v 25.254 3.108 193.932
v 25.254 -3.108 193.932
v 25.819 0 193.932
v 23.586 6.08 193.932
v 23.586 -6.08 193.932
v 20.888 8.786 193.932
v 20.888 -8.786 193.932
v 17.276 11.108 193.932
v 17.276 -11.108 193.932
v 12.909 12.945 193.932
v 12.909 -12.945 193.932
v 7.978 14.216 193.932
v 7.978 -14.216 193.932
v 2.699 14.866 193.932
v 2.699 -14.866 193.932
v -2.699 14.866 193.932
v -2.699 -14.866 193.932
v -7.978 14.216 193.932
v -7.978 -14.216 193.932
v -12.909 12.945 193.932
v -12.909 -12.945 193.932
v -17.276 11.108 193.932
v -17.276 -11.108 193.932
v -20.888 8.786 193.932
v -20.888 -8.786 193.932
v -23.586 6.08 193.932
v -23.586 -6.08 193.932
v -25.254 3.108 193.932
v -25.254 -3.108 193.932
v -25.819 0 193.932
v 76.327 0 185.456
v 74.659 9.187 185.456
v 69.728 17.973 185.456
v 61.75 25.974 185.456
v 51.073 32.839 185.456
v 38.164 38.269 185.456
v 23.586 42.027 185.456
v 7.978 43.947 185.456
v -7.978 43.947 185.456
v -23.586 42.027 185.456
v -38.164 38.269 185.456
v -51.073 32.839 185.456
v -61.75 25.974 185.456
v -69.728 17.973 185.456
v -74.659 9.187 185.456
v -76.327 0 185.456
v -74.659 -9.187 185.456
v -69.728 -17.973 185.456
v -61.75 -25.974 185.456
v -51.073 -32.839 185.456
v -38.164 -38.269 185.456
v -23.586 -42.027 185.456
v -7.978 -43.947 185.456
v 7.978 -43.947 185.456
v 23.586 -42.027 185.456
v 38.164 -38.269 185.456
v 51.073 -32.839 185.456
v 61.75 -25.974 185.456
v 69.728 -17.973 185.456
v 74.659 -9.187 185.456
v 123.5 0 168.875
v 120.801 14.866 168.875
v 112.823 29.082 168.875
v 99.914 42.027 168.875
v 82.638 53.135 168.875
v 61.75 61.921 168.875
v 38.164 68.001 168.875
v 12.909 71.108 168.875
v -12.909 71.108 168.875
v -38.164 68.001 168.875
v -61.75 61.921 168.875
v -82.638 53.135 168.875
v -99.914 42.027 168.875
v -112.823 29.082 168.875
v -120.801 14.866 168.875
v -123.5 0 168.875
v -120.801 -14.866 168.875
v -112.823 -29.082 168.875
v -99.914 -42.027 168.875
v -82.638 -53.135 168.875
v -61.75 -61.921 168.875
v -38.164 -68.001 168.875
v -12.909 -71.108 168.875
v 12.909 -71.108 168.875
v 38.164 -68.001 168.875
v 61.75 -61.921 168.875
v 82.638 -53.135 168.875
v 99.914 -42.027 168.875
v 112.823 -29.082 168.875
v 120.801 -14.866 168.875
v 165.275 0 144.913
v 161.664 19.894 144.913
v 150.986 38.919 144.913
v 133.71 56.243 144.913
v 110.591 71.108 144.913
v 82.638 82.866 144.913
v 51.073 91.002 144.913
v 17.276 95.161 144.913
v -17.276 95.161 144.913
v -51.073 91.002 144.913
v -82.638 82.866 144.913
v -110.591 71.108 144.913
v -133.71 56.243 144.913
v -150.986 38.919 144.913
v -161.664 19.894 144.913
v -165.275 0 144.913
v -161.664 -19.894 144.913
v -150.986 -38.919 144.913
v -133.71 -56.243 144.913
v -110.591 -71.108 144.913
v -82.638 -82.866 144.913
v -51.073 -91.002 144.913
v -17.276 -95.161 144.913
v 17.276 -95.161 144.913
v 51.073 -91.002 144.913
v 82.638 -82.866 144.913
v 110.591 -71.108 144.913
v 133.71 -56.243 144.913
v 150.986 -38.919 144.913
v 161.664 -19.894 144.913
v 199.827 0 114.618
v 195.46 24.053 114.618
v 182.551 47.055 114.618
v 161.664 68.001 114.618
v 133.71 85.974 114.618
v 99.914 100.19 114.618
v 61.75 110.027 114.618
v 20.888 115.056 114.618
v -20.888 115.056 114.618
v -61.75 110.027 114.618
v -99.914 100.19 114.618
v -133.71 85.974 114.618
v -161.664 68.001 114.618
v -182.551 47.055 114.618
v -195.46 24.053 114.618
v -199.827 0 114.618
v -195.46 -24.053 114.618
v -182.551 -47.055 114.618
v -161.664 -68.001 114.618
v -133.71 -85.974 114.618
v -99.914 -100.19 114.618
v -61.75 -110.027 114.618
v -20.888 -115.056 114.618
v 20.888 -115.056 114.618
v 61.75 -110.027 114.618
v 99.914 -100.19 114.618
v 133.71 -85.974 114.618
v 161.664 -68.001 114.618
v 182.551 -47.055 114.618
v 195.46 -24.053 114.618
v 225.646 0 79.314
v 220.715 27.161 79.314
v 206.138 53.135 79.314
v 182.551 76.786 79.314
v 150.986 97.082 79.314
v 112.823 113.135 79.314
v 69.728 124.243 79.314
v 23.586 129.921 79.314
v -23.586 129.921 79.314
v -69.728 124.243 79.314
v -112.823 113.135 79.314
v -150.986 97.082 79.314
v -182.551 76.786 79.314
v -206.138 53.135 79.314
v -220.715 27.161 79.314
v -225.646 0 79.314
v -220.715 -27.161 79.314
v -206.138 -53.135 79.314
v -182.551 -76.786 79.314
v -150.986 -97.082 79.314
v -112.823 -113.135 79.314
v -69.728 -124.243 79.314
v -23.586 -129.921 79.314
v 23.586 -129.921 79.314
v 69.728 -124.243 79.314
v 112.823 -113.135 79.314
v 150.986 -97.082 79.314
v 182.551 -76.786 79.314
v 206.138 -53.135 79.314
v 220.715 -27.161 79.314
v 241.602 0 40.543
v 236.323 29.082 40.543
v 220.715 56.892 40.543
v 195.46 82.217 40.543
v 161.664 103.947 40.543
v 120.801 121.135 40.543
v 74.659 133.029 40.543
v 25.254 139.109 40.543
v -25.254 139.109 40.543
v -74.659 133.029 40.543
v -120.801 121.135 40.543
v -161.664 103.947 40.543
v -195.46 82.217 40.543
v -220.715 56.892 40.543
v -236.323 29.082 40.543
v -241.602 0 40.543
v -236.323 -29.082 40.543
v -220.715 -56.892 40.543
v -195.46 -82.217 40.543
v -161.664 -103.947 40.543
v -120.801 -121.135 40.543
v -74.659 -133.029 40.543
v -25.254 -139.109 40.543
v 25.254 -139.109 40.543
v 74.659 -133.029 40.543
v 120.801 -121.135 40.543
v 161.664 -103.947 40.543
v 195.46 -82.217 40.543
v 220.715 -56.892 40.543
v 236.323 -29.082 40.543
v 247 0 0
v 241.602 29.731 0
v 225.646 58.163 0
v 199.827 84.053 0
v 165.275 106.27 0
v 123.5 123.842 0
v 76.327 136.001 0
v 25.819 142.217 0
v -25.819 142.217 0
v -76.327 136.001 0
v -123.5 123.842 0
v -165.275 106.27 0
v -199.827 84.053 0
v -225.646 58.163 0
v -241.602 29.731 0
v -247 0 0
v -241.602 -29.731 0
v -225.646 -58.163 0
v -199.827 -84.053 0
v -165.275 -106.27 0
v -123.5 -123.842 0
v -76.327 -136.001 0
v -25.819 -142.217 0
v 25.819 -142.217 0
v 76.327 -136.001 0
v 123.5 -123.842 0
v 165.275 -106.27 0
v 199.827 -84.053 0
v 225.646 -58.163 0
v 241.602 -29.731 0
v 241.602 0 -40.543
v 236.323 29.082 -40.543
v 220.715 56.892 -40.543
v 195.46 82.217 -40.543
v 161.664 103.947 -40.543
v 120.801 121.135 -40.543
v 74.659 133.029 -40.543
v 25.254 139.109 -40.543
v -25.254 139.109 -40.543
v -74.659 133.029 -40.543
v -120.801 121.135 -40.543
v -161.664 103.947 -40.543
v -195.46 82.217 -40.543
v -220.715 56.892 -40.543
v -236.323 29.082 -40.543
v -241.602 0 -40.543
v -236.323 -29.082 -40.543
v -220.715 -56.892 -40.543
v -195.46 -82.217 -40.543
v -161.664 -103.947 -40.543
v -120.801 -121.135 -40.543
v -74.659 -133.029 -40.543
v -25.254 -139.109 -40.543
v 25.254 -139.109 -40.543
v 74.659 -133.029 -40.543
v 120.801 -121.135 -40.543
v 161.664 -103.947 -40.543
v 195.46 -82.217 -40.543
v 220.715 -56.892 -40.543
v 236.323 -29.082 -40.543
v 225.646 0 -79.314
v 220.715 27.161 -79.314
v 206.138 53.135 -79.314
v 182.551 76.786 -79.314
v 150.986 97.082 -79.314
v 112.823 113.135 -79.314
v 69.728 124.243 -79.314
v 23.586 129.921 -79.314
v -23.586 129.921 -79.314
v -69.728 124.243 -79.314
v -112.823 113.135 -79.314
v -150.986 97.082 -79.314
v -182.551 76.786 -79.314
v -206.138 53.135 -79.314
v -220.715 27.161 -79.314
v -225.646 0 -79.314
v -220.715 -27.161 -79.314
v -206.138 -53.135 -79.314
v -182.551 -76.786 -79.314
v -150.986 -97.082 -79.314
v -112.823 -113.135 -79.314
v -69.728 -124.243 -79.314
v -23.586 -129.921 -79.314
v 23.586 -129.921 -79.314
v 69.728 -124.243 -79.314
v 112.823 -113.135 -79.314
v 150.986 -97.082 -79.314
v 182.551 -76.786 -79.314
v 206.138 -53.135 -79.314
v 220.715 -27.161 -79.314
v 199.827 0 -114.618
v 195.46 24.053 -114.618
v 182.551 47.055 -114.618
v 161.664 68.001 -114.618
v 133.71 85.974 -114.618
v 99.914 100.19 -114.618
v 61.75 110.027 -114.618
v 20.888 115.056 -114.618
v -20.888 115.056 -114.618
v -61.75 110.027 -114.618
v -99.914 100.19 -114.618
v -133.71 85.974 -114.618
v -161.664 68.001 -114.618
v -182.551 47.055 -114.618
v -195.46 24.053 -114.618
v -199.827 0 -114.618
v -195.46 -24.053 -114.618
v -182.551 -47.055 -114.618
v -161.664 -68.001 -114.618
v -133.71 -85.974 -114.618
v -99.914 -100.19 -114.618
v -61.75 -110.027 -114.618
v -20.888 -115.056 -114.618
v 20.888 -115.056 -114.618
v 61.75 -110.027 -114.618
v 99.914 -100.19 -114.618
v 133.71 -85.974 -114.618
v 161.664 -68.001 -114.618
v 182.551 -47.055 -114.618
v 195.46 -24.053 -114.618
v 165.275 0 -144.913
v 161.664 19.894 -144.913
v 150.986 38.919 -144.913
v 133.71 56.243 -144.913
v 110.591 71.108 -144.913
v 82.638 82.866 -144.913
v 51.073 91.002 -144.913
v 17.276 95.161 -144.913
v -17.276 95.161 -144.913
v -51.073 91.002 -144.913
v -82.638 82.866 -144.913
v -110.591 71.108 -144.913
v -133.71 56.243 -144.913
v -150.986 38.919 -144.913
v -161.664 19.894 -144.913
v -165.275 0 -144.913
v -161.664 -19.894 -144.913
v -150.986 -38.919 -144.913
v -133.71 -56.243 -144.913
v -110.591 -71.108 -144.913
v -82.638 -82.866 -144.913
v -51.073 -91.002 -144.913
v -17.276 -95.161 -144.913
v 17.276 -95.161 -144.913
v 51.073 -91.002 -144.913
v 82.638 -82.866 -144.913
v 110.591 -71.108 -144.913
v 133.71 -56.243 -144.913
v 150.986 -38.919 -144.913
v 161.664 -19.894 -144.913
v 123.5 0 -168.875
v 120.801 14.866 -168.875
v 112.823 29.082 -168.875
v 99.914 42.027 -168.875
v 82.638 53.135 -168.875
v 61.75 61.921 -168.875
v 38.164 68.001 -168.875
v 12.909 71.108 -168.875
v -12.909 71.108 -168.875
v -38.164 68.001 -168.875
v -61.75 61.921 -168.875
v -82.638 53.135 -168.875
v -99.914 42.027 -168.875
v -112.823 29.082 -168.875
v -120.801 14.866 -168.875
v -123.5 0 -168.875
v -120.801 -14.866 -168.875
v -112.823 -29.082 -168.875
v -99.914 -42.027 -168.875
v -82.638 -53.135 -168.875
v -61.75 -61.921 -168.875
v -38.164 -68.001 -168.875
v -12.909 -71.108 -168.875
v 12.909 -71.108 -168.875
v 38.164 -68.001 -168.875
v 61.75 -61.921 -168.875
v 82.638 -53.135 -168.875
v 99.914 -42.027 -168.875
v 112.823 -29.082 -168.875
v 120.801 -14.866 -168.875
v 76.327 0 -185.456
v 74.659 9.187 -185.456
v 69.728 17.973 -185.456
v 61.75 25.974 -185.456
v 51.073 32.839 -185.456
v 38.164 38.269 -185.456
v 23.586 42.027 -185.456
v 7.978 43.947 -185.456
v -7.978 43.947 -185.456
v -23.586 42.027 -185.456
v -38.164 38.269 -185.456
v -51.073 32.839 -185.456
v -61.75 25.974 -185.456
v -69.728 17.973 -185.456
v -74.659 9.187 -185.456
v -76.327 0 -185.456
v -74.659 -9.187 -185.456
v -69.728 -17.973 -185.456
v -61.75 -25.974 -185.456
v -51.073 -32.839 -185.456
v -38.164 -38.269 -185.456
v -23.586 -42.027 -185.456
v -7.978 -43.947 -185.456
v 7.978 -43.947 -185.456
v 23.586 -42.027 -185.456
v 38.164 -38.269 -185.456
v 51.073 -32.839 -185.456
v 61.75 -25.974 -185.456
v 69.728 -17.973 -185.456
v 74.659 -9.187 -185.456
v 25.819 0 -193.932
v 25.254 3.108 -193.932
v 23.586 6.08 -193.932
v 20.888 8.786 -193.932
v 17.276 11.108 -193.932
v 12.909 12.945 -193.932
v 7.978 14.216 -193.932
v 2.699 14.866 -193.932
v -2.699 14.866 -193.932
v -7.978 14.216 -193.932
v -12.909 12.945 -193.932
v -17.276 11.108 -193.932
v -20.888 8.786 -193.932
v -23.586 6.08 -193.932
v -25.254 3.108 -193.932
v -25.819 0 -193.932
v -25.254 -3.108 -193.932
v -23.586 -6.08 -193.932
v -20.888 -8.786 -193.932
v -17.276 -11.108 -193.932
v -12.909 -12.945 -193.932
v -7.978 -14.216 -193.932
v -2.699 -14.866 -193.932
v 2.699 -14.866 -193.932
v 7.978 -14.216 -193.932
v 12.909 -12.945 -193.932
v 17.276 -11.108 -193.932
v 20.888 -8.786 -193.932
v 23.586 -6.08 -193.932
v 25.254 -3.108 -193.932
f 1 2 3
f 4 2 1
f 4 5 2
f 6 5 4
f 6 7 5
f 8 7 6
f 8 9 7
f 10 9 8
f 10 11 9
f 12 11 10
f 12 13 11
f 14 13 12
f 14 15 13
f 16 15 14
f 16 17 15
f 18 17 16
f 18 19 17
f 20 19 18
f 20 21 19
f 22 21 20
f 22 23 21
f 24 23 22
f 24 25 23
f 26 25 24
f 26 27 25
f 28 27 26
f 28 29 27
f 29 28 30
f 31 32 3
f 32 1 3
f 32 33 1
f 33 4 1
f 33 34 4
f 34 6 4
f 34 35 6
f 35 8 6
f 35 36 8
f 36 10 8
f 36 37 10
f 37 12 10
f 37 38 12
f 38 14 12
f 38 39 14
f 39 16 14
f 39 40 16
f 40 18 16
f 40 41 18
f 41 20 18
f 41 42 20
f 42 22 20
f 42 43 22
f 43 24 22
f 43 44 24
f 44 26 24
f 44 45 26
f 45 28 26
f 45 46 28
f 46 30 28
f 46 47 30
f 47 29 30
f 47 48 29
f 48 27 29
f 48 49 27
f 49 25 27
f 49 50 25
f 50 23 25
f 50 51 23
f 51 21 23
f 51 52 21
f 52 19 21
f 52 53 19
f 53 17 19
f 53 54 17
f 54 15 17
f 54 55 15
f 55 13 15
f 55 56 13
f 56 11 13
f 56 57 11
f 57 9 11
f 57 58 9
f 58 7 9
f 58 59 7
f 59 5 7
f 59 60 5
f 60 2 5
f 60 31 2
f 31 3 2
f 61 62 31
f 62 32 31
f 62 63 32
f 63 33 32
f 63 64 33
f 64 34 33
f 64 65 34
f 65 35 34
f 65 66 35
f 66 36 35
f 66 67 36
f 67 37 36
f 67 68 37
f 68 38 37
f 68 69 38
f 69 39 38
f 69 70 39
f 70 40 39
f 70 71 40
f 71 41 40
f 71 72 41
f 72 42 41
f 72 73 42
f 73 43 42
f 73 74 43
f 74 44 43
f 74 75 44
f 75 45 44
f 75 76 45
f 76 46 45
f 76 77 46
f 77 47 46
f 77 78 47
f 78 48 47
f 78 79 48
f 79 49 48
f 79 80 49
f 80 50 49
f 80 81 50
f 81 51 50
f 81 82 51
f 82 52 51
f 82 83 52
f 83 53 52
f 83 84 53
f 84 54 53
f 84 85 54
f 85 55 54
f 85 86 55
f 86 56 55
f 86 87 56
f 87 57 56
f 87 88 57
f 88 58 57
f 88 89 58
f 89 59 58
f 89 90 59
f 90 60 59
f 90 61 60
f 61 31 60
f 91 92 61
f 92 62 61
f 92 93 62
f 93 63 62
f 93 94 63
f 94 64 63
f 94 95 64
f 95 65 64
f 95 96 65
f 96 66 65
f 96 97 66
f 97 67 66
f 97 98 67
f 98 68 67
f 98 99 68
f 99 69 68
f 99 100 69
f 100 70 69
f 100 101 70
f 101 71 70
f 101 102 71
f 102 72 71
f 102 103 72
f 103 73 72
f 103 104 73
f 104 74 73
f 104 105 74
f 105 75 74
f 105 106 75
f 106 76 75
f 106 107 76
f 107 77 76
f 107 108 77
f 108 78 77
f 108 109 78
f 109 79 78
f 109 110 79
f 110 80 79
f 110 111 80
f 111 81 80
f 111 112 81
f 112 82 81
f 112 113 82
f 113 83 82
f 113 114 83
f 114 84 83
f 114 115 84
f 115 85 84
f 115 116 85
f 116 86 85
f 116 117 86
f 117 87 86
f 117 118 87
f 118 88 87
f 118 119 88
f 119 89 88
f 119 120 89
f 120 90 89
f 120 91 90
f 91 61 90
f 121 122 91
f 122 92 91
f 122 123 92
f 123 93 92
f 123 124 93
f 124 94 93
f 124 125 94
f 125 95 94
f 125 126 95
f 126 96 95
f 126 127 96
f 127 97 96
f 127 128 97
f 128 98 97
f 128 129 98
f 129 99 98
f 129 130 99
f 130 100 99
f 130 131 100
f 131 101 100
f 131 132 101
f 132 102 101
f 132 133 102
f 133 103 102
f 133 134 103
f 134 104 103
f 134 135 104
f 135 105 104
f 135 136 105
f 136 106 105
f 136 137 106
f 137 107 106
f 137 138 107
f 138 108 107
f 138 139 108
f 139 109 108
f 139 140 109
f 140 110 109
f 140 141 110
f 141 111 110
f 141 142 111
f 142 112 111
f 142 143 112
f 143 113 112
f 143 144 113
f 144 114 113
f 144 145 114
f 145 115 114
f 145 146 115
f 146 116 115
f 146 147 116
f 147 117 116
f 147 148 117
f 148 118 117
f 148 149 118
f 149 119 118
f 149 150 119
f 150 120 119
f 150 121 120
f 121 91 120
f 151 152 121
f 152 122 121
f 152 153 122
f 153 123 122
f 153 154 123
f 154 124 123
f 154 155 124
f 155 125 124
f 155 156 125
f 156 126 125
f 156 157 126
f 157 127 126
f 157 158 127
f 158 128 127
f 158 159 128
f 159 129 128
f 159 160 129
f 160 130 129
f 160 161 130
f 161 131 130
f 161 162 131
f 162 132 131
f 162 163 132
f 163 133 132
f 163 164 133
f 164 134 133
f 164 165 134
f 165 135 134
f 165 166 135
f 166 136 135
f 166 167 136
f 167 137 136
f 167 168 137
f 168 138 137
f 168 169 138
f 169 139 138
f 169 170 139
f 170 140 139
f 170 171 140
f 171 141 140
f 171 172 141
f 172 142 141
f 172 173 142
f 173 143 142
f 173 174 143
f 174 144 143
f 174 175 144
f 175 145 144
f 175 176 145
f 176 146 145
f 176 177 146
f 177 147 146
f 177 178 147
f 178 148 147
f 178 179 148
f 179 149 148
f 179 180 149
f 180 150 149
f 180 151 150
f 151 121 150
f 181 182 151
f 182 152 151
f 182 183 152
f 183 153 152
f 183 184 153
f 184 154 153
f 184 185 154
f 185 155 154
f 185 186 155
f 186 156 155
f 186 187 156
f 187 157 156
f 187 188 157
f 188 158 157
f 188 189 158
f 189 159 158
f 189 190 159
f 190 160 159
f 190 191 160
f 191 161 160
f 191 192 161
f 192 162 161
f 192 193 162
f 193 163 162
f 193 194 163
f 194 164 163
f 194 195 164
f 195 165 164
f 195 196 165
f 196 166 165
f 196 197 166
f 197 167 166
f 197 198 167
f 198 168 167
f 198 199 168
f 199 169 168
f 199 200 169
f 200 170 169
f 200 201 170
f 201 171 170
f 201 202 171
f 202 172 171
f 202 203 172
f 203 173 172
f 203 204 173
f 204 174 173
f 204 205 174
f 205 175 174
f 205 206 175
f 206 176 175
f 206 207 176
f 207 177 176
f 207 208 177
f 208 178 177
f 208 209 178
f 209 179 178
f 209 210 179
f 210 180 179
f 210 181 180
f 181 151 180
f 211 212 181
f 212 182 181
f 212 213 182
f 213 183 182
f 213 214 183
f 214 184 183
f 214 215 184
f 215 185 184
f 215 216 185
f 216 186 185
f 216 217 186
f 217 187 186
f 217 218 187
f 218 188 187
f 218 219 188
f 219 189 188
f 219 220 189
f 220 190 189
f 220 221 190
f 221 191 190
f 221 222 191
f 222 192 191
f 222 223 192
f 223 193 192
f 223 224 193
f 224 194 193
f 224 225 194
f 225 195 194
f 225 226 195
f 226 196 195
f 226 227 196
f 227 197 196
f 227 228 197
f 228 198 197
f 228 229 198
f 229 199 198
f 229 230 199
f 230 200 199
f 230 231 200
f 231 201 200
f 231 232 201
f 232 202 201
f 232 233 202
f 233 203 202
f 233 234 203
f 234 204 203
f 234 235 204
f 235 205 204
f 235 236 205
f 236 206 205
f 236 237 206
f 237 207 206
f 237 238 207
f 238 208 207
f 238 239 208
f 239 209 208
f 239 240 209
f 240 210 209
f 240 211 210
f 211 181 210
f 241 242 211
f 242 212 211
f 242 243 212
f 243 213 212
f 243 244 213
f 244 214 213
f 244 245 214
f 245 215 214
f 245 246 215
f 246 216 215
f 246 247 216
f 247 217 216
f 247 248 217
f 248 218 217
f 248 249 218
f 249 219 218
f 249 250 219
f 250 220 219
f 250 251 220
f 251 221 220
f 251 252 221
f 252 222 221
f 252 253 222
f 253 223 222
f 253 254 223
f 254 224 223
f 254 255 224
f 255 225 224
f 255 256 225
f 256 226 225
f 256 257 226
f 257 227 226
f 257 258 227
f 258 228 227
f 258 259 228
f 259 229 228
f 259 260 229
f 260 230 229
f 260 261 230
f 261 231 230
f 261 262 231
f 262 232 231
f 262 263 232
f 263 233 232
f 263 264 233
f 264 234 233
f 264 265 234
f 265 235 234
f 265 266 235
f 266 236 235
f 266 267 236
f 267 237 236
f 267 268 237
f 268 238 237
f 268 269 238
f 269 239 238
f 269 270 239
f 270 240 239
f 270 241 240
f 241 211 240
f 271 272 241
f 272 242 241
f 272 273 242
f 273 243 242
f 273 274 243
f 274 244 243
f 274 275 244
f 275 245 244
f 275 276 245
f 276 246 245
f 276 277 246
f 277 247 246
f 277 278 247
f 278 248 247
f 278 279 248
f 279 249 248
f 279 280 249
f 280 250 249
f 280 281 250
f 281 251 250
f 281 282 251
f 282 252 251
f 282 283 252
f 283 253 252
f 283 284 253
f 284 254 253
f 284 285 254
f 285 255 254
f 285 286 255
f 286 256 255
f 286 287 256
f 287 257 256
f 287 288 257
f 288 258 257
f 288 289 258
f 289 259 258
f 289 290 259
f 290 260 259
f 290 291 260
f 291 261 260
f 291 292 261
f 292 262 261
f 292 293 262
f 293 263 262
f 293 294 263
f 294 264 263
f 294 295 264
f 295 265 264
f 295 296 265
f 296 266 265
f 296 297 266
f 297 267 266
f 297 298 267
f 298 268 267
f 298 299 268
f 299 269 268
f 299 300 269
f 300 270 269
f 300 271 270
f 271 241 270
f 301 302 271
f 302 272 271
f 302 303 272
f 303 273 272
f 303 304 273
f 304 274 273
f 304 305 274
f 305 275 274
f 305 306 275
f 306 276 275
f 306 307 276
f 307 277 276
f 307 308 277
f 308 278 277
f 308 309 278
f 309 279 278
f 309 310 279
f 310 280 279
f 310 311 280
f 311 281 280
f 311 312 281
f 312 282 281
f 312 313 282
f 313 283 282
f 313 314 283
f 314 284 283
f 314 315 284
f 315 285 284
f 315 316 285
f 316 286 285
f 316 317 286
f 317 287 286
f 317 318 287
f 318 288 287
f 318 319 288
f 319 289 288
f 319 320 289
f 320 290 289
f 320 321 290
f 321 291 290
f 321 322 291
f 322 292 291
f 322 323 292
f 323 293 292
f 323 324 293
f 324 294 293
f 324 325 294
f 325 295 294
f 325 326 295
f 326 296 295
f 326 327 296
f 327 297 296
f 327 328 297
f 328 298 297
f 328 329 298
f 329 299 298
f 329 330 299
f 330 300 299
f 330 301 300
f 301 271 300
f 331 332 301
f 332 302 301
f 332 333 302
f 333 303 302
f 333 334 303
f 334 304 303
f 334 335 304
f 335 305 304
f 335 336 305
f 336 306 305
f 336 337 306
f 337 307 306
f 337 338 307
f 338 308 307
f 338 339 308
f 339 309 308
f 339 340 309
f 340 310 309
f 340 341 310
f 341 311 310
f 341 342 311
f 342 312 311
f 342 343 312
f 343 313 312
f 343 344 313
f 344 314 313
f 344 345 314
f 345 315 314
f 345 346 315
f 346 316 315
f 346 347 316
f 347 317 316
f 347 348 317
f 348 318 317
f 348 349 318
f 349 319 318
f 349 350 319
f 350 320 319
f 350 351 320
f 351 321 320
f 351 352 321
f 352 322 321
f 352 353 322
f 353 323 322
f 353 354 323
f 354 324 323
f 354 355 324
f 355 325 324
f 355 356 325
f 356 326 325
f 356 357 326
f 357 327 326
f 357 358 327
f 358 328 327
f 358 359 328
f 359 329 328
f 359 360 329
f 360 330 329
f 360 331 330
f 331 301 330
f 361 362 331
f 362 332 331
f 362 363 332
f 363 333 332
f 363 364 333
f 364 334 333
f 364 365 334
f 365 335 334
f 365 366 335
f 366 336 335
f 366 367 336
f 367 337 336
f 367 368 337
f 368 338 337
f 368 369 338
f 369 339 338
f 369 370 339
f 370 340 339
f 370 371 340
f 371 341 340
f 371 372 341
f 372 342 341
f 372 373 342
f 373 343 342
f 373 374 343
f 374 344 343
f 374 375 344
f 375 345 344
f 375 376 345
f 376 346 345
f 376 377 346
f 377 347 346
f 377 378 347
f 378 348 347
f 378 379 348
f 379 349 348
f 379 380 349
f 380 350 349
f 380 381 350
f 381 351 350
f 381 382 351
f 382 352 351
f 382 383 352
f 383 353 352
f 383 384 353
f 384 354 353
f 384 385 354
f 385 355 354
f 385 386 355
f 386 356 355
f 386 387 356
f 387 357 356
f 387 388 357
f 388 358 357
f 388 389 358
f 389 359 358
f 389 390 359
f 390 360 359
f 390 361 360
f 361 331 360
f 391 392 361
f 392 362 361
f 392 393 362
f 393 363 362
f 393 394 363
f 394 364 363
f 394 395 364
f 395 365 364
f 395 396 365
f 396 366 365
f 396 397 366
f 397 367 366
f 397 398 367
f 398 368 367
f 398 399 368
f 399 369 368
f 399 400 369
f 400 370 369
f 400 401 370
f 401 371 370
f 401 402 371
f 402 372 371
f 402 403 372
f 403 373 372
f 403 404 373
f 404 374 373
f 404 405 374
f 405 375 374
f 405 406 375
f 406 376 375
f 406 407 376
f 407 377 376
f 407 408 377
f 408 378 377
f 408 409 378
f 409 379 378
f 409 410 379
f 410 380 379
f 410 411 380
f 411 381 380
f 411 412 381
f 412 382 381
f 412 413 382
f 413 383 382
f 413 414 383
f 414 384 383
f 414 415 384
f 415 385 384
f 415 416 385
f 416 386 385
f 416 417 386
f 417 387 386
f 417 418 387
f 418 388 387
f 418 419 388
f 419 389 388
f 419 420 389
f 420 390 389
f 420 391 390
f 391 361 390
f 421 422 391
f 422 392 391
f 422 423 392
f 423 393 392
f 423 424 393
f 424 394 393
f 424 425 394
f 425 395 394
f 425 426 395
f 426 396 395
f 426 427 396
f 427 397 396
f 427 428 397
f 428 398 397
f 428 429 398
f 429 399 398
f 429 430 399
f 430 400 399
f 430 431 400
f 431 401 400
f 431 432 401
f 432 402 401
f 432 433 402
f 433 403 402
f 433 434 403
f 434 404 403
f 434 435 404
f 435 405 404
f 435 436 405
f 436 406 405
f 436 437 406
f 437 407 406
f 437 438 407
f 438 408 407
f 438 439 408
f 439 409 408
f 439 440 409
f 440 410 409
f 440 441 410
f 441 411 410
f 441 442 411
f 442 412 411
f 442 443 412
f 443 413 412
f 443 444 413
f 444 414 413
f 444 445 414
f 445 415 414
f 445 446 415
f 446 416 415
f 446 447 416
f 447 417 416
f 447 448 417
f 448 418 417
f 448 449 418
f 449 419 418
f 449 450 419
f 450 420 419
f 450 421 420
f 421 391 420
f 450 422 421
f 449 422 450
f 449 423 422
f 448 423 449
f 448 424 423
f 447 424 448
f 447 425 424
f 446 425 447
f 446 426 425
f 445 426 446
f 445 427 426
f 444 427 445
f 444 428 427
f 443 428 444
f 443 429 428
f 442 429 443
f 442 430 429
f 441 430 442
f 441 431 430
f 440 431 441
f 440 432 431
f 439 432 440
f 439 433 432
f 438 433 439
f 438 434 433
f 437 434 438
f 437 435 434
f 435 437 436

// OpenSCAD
// Generated by SolidPython 1.0.1 on 2020-07-29 00:46:54


scale(v = [19, 11, 15]) {
	sphere(r = 13);
}
/***********************************************
*********      SolidPython code:      **********
************************************************
 
# import packages: SolidPython
from solid import *
from solid.utils import *
from itertools import chain, combinations, permutations


class Resize:

    def __init__(self, scad_file):
        self.scad_file = scad_file
        #self.scad_file = import_scad(scad_file)
        # cone/cylinder param:
        self.r1 = 0
        self.r2 = 0
        self.h = 0
        # rectangular prism param:
        self.w = 0
        self.l = 0
        # ellipse param:
        self.r = 0

    # import OpenScad code (file name corresponds to shape)


    # classify shape + parameters
    def assign(self, param1, param2, param3):
        if self.scad_file == 'cone.scad':
            self.r1 = param1
            self.r2 = param2
            self.h = param3
        elif self.scad_file == 'cylinder.scad':
            self.r1 = param1
            self.r2 = param2
            self.h = param3
        elif self.scad_file == 'rectangularPrism.scad':
            self.h = param1
            self.l = param2
            self.w = param3
        else:
            self.r = param1
            self.h = param2

    # resize parameters
    def iterate(self):
        x = range(3, 20, 2)
        i = 1
        if self.scad_file == 'cone.scad':
            tempList = list(permutations(x, 2))
            for temp in tempList:
                param1 = temp[0]
                param2 = temp[1]
                filepath = 'produced_scad_files/' + 'cone' + str(param1) + '_' + str(param2) + '_' + '.scad'
                scad_render_to_file(cylinder(h=param1, r1=param2, r2=0), filepath)

        elif self.scad_file == 'cylinder.scad':
            tempList = list(permutations(x, 3))
            for temp in tempList:
                param1 = temp[0]
                param2 = temp[1]
                filepath = 'produced_scad_files/' + 'cylinder' + str(param1) + '_' + str(param2) + '_' + '.scad'
                scad_render_to_file(cylinder(h=param1, r1=param2, r2=param2), filepath)

        elif self.scad_file == 'rectangularPrism.scad':
            tempList = list(permutations(x, 3))
            for temp in tempList:
                param1 = temp[0]
                param2 = temp[1]
                param3 = temp[2]
                filepath = 'produced_scad_files/' + 'rectangularPrism' + str(param1) + '_' + str(param2) + '_' + str(
                    param3) + '.scad'
                scad_render_to_file(cube(size=(param1, param2, param3)), filepath)

        elif self.scad_file == 'ellipse.scad':
            tempList = list(permutations(x, 4))
            for temp in tempList:
                param1 = temp[0]
                param2 = temp[1]
                param3 = temp[2]
                param4 = temp[3]
                filepath = 'produced_scad_files/' + 'ellipse' + str(param1) + '_' + str(param2) + '_' + str(param3) + '_' + str(param4) + '.scad'
                scad_render_to_file(scale([param1, param2, param3])(sphere(r=param4)), filepath)

    def render_to_scadfile(self):
        scad_render_to_file(scad, 'example.scad') 
 
************************************************/
